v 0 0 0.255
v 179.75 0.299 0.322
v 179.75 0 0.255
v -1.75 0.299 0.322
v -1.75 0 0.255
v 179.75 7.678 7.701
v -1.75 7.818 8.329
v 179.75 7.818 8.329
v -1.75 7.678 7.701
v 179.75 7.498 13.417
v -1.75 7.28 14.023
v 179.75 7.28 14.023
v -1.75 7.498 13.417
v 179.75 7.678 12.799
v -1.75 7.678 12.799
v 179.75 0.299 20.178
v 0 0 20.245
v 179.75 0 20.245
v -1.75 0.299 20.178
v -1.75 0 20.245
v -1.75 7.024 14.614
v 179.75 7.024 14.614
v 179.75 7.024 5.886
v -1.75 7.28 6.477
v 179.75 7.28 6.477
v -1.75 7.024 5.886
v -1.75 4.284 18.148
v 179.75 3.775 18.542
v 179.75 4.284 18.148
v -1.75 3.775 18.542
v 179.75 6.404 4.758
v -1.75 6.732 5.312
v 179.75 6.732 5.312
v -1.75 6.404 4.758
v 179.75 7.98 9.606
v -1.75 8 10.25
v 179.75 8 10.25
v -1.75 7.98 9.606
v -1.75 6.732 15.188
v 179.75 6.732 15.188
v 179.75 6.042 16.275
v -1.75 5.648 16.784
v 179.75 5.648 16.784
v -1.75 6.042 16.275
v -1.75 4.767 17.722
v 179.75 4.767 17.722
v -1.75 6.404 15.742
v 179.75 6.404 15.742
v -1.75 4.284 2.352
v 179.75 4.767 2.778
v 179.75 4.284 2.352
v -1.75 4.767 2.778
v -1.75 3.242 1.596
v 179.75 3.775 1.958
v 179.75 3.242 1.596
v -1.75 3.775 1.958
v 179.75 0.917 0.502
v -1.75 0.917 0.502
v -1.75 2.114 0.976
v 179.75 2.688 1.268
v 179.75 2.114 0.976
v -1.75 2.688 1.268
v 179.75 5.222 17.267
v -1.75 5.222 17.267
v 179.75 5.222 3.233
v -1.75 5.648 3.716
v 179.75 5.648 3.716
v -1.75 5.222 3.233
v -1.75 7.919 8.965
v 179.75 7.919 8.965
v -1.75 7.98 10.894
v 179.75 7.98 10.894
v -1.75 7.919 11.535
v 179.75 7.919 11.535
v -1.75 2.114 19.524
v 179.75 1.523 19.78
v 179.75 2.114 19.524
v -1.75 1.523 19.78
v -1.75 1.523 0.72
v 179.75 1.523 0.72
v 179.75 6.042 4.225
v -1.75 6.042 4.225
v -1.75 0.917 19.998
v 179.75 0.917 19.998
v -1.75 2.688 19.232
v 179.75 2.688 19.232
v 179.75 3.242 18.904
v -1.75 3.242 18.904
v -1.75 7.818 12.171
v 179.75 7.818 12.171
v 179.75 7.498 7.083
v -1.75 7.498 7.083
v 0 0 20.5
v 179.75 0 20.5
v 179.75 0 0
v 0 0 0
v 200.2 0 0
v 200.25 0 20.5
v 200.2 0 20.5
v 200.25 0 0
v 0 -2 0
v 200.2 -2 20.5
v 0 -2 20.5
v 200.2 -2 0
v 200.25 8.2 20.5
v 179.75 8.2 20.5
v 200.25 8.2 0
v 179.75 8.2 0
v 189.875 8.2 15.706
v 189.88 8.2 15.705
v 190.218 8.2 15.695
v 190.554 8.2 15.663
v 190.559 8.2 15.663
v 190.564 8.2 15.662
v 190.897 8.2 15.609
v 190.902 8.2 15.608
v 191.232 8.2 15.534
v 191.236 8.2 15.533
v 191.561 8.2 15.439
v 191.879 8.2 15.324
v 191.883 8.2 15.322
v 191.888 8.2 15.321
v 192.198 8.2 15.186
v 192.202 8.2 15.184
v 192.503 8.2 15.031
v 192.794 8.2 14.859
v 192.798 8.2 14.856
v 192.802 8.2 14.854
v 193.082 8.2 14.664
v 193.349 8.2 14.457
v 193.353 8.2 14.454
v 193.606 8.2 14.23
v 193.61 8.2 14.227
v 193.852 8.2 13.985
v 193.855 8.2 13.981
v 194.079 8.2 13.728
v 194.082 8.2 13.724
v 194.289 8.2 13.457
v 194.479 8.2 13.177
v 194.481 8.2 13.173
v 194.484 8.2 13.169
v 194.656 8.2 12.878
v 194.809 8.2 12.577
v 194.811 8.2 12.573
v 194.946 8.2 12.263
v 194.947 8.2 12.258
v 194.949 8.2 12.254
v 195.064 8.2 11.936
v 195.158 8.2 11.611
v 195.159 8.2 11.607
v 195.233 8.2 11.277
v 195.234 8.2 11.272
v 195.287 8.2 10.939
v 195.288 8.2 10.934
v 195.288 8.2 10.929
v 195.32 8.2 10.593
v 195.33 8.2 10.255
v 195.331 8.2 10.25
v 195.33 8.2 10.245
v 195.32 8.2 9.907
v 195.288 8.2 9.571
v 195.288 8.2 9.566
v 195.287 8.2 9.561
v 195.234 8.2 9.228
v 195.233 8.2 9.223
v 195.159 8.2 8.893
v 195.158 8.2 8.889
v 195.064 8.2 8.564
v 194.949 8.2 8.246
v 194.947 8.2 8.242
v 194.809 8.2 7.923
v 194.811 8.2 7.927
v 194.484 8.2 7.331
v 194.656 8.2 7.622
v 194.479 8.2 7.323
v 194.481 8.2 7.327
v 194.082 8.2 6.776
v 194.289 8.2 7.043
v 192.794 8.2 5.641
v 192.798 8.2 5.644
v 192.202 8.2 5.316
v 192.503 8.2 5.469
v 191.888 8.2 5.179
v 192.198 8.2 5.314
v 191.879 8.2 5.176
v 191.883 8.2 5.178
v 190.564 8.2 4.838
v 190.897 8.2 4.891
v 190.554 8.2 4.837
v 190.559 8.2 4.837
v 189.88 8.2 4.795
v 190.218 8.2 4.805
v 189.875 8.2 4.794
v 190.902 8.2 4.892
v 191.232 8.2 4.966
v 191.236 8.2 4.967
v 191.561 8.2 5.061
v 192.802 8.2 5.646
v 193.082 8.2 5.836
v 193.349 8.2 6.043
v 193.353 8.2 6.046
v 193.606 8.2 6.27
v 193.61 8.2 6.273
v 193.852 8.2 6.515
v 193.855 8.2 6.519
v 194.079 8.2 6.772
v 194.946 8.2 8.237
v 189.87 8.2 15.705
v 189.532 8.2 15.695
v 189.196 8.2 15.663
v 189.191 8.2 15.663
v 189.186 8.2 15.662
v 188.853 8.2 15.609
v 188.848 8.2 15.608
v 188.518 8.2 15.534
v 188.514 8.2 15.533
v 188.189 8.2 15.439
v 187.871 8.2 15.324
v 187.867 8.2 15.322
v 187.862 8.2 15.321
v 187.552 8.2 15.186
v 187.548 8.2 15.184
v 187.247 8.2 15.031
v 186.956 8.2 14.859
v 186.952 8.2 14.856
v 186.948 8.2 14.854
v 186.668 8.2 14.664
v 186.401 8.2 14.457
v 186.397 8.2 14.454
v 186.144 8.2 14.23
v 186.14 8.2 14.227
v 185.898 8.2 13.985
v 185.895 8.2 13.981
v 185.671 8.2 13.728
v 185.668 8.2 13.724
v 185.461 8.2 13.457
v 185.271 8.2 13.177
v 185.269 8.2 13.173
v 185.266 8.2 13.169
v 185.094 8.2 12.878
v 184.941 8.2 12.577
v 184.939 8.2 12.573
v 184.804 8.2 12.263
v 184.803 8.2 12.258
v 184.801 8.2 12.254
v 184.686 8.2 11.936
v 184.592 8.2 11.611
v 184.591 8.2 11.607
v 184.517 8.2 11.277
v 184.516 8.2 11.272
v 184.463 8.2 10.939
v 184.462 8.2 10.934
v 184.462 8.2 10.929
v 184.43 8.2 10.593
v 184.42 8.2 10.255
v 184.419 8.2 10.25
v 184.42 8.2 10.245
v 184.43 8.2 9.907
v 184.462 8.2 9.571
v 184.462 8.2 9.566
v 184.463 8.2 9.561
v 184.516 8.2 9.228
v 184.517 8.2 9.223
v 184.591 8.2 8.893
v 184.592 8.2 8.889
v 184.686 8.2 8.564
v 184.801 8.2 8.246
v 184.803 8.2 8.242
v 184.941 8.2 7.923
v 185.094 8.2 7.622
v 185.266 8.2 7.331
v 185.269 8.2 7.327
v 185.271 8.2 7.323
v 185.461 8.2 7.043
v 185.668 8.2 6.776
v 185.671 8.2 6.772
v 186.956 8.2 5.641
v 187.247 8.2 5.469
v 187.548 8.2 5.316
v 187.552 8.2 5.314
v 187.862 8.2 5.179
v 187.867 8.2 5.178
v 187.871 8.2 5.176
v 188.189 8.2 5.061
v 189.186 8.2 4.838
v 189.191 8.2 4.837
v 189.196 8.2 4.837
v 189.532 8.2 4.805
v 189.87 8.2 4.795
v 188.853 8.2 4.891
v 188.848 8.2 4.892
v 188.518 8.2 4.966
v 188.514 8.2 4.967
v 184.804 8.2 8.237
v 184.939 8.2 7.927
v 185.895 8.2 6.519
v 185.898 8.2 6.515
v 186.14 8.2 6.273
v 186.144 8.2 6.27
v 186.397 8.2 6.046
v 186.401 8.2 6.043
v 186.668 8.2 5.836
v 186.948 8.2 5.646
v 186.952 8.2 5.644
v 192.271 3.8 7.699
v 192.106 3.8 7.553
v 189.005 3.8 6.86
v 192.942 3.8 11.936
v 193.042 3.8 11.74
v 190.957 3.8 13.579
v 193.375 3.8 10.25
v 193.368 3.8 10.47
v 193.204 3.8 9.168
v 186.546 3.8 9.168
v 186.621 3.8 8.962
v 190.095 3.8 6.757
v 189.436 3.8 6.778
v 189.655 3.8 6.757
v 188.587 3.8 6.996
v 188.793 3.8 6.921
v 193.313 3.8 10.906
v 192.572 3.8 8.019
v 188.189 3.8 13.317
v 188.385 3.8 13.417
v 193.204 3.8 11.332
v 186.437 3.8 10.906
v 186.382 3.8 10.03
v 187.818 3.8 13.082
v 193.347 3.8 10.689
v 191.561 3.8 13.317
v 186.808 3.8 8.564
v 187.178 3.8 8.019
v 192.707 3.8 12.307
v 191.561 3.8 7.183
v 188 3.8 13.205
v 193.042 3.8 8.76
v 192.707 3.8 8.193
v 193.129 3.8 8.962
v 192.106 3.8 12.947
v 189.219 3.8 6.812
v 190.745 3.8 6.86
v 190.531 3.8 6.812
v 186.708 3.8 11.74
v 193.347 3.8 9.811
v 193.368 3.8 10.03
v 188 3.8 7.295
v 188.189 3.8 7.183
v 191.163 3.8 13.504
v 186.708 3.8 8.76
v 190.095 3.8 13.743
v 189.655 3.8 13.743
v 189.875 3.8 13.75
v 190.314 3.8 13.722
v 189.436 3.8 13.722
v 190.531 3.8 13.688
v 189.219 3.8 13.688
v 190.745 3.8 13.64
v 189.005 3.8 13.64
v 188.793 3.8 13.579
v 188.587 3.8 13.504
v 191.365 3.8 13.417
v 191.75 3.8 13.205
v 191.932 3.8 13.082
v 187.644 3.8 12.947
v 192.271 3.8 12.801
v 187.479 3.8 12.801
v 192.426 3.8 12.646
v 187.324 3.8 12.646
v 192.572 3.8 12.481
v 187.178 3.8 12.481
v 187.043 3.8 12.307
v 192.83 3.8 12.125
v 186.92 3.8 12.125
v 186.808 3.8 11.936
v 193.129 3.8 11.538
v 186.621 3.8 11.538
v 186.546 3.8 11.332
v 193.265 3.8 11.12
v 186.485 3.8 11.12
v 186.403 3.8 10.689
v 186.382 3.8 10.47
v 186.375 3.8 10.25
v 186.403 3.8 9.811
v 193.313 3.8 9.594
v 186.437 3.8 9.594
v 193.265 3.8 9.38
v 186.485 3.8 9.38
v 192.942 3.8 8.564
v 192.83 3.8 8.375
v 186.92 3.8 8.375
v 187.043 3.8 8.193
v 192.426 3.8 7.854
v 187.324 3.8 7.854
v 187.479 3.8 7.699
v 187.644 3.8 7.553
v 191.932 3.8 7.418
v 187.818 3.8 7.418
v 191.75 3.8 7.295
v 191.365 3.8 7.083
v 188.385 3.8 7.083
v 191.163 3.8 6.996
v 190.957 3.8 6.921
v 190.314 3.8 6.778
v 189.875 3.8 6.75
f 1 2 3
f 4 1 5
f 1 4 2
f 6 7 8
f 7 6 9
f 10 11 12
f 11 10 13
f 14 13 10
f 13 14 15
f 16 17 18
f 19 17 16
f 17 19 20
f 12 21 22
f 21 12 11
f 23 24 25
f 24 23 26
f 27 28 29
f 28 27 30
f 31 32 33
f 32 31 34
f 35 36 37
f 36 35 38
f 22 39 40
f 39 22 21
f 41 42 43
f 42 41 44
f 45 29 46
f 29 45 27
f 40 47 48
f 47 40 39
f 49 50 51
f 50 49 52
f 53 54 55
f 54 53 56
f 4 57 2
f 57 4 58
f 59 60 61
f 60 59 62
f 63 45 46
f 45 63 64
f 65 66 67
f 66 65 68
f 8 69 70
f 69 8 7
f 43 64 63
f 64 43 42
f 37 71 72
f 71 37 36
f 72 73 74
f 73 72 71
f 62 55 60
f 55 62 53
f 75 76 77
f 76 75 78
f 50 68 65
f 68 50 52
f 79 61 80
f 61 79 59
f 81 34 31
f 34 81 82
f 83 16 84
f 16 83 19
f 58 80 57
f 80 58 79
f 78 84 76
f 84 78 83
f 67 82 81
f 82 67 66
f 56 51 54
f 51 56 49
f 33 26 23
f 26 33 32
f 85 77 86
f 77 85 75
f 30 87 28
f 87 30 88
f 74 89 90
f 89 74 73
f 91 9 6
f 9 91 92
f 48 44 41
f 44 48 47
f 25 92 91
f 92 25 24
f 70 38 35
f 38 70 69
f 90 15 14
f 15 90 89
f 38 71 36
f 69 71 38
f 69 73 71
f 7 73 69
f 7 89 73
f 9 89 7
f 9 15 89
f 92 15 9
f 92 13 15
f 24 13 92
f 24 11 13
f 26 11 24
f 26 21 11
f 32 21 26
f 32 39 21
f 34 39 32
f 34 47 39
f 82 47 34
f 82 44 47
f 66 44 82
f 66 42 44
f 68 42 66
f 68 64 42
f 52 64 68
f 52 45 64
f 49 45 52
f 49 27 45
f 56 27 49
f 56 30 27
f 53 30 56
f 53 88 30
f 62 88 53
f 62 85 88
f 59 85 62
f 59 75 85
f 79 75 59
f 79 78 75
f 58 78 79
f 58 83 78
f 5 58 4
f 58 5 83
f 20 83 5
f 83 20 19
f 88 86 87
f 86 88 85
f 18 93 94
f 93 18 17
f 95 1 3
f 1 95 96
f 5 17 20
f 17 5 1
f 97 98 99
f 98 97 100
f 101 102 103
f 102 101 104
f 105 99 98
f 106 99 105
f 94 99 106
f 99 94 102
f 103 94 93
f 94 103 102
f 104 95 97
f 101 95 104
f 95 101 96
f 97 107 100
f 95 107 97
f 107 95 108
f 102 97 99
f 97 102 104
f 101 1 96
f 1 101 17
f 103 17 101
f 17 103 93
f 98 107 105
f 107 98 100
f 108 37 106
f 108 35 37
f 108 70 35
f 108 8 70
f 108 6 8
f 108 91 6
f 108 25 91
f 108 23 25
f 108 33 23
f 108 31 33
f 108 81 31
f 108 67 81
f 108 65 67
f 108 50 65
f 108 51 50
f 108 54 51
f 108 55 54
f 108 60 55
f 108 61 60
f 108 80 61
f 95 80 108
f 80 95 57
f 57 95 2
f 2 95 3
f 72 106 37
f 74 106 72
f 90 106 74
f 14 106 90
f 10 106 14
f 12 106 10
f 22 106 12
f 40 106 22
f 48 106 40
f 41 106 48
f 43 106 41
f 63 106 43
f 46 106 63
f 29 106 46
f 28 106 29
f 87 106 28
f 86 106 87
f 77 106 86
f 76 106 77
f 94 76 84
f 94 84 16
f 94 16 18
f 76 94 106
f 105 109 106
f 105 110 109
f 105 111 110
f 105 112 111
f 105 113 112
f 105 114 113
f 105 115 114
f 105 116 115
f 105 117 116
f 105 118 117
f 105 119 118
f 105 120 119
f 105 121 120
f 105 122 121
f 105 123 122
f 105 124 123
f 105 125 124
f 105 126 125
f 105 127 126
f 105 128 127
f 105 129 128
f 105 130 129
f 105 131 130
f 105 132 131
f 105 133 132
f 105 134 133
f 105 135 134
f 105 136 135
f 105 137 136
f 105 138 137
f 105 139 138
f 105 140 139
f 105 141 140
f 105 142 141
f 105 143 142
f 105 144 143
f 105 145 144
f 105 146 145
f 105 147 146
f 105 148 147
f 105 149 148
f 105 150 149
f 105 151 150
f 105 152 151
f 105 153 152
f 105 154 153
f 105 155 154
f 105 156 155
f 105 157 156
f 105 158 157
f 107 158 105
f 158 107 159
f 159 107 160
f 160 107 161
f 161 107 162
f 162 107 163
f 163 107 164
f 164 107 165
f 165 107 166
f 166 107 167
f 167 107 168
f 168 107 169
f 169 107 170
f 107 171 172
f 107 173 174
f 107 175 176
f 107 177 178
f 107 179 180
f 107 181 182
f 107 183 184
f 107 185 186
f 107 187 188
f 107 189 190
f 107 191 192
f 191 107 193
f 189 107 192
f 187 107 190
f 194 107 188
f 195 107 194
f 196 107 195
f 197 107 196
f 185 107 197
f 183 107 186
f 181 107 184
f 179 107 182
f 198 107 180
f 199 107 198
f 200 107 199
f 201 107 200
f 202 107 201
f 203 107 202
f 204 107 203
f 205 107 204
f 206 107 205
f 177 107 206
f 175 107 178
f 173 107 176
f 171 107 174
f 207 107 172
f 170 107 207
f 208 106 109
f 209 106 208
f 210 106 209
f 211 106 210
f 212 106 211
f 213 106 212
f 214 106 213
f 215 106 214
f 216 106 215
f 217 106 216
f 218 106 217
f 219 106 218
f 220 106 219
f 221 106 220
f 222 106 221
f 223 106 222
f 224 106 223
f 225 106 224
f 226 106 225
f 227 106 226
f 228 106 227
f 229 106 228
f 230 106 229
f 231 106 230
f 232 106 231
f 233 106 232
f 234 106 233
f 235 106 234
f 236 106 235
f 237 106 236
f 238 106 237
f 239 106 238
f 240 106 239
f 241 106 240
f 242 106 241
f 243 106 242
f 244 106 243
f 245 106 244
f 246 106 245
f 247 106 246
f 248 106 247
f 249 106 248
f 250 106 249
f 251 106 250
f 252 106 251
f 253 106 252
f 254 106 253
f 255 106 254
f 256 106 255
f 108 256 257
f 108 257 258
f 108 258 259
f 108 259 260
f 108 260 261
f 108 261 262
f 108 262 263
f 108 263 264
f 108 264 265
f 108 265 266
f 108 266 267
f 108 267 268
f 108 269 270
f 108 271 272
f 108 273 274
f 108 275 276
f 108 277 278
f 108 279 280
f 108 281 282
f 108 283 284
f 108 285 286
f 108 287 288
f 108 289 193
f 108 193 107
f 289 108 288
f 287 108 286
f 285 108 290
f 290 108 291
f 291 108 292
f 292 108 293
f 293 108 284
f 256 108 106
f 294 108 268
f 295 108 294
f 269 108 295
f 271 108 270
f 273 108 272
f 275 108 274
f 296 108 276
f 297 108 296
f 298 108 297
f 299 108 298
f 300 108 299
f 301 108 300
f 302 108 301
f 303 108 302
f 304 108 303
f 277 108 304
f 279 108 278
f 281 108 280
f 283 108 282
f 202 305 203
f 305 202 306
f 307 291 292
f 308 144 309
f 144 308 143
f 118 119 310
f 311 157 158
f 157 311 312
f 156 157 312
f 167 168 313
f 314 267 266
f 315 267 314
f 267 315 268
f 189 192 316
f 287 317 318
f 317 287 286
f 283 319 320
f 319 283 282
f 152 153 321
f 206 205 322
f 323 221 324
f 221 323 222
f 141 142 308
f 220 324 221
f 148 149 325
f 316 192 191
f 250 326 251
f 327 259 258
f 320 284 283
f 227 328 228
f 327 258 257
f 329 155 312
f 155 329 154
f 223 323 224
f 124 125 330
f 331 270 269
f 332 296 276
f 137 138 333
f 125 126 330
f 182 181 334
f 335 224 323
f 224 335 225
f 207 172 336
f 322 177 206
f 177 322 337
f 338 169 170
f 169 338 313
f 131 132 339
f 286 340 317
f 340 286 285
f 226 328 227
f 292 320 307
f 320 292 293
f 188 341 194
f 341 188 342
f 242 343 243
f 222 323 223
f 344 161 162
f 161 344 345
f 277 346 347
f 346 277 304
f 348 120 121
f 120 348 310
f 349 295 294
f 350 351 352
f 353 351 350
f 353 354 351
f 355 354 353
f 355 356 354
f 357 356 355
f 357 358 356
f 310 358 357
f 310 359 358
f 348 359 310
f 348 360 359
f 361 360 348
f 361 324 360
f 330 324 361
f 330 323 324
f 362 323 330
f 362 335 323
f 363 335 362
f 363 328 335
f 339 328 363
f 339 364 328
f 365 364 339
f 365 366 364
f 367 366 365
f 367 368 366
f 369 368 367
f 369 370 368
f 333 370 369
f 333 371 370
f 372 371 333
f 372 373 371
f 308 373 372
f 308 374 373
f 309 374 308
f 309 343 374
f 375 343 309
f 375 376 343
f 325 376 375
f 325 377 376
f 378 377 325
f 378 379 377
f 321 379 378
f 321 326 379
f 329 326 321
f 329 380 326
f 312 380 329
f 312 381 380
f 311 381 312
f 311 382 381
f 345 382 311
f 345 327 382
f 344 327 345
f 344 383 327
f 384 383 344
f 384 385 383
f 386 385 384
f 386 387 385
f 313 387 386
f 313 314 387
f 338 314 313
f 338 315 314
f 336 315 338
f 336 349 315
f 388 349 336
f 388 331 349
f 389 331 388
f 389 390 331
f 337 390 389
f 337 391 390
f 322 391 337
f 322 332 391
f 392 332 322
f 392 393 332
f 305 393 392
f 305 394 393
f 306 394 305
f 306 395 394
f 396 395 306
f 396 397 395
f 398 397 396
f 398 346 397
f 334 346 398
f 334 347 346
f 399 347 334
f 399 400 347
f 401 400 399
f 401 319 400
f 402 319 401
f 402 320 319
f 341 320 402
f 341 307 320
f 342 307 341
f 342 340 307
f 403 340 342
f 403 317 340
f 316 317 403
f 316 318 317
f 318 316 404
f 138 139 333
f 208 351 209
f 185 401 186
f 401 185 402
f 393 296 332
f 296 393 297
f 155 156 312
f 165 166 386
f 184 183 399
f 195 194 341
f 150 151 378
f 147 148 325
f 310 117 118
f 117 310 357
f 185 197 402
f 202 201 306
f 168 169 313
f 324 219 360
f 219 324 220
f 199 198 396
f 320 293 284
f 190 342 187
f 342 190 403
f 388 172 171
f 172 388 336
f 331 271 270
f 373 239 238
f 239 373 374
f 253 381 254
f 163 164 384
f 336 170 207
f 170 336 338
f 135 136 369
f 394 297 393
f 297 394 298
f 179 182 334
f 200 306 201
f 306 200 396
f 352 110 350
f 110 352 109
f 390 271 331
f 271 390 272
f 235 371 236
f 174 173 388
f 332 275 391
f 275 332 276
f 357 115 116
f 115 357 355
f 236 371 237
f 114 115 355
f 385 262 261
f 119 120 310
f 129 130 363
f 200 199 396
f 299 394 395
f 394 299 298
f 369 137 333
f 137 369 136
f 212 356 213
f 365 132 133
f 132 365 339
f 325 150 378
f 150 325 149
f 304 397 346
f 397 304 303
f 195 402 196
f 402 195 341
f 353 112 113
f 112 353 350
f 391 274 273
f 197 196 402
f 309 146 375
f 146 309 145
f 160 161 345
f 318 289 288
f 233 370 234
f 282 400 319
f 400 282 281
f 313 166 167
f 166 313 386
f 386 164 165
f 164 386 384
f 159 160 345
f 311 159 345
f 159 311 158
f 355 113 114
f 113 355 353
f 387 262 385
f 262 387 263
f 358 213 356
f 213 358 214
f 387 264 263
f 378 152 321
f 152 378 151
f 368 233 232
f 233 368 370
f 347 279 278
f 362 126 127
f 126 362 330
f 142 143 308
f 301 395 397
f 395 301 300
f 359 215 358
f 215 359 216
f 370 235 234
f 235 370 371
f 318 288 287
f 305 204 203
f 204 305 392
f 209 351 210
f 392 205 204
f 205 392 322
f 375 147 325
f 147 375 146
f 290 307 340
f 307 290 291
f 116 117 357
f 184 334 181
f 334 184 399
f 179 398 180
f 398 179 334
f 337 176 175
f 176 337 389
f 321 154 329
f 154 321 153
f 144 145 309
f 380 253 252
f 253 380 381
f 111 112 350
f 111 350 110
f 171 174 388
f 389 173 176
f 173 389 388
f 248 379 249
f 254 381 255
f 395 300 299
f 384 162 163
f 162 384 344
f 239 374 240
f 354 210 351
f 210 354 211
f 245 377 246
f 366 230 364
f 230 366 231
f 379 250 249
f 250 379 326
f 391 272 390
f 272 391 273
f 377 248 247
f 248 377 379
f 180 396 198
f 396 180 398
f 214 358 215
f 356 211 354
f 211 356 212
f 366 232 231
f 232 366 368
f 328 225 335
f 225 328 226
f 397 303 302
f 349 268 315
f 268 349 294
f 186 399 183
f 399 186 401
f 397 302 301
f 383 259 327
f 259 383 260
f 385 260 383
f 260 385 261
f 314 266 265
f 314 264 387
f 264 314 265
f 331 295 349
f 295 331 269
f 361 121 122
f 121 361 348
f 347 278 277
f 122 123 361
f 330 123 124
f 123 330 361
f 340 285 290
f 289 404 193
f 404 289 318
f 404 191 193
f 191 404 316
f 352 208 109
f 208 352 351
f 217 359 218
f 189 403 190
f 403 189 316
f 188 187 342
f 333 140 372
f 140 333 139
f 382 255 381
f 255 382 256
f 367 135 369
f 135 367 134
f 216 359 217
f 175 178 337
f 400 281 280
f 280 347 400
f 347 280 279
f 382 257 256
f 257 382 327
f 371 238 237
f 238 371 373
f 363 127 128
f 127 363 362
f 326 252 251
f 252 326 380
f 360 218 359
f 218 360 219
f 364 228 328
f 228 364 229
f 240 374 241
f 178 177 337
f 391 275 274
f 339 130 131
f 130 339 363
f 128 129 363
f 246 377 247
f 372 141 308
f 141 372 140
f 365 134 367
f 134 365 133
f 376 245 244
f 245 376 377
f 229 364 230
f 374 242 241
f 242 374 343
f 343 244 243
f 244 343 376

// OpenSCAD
epaisseur_crochet = 2;
largeur_crochet = 20;
base_basse = 25;
base_haute = 14;
hauteur_crochet = 10.5;
longueur_crochet = 200;
petite_longueur_crochet = 35;
manifold = 0.2;

module crochet(marge){
	union(){
		color("red") cube([epaisseur_crochet,base_basse+manifold,largeur_crochet+marge]);

		translate ([epaisseur_crochet-manifold,epaisseur_crochet,0]) 
			rotate ([0,0,-90]) color("blue") 
				cube([epaisseur_crochet,petite_longueur_crochet+manifold,largeur_crochet+marge]);

		translate ([epaisseur_crochet,base_basse,0]) 
			rotate ([0,0,90]) color("green") 
				cube([epaisseur_crochet,hauteur_crochet+manifold,largeur_crochet+marge]);

		translate ([-hauteur_crochet,base_basse,0]) 
			color("purple") 
				cube([epaisseur_crochet,(base_haute+2*epaisseur_crochet),largeur_crochet+marge]);

		translate ([-(hauteur_crochet-epaisseur_crochet+manifold),(base_basse+base_haute+2*epaisseur_crochet),0]) 
			tige_principale(marge);
	}
}


module crochet_plat(marge){
	union(){
		translate ([epaisseur_crochet-manifold,epaisseur_crochet,0]) 
			rotate ([0,0,-90]) color("blue") 
				cube([epaisseur_crochet,petite_longueur_crochet+manifold,largeur_crochet+marge]);

		translate ([0,manifold,0]) 
			color("purple") 
				cube([epaisseur_crochet,(base_haute+base_basse+epaisseur_crochet),largeur_crochet+marge]);

		translate ([epaisseur_crochet,(base_basse+base_haute+epaisseur_crochet),0]) 
			tige_principale(marge);
	}
}

module crochet_meuble(marge){
	union(){
		translate ([0,base_haute+manifold,0]) 
			color("purple") 
				cube([epaisseur_crochet,(base_basse+epaisseur_crochet),largeur_crochet+marge]);

		translate ([epaisseur_crochet,(base_basse+base_haute+epaisseur_crochet),0]) 
			tige_principale(marge);
	}
}

module tige_principale(marge){
	hauteur_cube = 8;
	a = ((largeur_crochet*largeur_crochet)/(8*hauteur_cube))-(hauteur_cube/2);
echo(a);
	rayon_cylindre = a+hauteur_cube;
	difference(){
		union(){
			rotate ([0,0,-90]) color("yellow") 
				cube([epaisseur_crochet,longueur_crochet+manifold,largeur_crochet+marge]);
			translate([(longueur_crochet+marge-largeur_crochet-epaisseur_crochet)/2,-a,rayon_cylindre])
				difference(){
					rotate ([0,90,0])
						cylinder (r=rayon_cylindre, h=longueur_crochet-largeur_crochet+epaisseur_crochet, $fn=100, center=true);
					translate([0,a-(rayon_cylindre+a)/2,0])
						cube([longueur_crochet,rayon_cylindre+a,2*rayon_cylindre], center=true);
				}
			translate ([longueur_crochet-(largeur_crochet+marge/2),0,0]) 
				cube([largeur_crochet+marge,hauteur_cube+manifold,largeur_crochet+marge]);
		}
		translate ([longueur_crochet-((largeur_crochet+marge/2)/2),7.8+marge,(largeur_crochet+marge)/2]) 
			rotate ([90,0,0]) color("cyan") 
				cylinder (r1=marge+5, r2=marge+3, h=marge+4, $fn=100);
	}
}

tige_principale(0.5);
